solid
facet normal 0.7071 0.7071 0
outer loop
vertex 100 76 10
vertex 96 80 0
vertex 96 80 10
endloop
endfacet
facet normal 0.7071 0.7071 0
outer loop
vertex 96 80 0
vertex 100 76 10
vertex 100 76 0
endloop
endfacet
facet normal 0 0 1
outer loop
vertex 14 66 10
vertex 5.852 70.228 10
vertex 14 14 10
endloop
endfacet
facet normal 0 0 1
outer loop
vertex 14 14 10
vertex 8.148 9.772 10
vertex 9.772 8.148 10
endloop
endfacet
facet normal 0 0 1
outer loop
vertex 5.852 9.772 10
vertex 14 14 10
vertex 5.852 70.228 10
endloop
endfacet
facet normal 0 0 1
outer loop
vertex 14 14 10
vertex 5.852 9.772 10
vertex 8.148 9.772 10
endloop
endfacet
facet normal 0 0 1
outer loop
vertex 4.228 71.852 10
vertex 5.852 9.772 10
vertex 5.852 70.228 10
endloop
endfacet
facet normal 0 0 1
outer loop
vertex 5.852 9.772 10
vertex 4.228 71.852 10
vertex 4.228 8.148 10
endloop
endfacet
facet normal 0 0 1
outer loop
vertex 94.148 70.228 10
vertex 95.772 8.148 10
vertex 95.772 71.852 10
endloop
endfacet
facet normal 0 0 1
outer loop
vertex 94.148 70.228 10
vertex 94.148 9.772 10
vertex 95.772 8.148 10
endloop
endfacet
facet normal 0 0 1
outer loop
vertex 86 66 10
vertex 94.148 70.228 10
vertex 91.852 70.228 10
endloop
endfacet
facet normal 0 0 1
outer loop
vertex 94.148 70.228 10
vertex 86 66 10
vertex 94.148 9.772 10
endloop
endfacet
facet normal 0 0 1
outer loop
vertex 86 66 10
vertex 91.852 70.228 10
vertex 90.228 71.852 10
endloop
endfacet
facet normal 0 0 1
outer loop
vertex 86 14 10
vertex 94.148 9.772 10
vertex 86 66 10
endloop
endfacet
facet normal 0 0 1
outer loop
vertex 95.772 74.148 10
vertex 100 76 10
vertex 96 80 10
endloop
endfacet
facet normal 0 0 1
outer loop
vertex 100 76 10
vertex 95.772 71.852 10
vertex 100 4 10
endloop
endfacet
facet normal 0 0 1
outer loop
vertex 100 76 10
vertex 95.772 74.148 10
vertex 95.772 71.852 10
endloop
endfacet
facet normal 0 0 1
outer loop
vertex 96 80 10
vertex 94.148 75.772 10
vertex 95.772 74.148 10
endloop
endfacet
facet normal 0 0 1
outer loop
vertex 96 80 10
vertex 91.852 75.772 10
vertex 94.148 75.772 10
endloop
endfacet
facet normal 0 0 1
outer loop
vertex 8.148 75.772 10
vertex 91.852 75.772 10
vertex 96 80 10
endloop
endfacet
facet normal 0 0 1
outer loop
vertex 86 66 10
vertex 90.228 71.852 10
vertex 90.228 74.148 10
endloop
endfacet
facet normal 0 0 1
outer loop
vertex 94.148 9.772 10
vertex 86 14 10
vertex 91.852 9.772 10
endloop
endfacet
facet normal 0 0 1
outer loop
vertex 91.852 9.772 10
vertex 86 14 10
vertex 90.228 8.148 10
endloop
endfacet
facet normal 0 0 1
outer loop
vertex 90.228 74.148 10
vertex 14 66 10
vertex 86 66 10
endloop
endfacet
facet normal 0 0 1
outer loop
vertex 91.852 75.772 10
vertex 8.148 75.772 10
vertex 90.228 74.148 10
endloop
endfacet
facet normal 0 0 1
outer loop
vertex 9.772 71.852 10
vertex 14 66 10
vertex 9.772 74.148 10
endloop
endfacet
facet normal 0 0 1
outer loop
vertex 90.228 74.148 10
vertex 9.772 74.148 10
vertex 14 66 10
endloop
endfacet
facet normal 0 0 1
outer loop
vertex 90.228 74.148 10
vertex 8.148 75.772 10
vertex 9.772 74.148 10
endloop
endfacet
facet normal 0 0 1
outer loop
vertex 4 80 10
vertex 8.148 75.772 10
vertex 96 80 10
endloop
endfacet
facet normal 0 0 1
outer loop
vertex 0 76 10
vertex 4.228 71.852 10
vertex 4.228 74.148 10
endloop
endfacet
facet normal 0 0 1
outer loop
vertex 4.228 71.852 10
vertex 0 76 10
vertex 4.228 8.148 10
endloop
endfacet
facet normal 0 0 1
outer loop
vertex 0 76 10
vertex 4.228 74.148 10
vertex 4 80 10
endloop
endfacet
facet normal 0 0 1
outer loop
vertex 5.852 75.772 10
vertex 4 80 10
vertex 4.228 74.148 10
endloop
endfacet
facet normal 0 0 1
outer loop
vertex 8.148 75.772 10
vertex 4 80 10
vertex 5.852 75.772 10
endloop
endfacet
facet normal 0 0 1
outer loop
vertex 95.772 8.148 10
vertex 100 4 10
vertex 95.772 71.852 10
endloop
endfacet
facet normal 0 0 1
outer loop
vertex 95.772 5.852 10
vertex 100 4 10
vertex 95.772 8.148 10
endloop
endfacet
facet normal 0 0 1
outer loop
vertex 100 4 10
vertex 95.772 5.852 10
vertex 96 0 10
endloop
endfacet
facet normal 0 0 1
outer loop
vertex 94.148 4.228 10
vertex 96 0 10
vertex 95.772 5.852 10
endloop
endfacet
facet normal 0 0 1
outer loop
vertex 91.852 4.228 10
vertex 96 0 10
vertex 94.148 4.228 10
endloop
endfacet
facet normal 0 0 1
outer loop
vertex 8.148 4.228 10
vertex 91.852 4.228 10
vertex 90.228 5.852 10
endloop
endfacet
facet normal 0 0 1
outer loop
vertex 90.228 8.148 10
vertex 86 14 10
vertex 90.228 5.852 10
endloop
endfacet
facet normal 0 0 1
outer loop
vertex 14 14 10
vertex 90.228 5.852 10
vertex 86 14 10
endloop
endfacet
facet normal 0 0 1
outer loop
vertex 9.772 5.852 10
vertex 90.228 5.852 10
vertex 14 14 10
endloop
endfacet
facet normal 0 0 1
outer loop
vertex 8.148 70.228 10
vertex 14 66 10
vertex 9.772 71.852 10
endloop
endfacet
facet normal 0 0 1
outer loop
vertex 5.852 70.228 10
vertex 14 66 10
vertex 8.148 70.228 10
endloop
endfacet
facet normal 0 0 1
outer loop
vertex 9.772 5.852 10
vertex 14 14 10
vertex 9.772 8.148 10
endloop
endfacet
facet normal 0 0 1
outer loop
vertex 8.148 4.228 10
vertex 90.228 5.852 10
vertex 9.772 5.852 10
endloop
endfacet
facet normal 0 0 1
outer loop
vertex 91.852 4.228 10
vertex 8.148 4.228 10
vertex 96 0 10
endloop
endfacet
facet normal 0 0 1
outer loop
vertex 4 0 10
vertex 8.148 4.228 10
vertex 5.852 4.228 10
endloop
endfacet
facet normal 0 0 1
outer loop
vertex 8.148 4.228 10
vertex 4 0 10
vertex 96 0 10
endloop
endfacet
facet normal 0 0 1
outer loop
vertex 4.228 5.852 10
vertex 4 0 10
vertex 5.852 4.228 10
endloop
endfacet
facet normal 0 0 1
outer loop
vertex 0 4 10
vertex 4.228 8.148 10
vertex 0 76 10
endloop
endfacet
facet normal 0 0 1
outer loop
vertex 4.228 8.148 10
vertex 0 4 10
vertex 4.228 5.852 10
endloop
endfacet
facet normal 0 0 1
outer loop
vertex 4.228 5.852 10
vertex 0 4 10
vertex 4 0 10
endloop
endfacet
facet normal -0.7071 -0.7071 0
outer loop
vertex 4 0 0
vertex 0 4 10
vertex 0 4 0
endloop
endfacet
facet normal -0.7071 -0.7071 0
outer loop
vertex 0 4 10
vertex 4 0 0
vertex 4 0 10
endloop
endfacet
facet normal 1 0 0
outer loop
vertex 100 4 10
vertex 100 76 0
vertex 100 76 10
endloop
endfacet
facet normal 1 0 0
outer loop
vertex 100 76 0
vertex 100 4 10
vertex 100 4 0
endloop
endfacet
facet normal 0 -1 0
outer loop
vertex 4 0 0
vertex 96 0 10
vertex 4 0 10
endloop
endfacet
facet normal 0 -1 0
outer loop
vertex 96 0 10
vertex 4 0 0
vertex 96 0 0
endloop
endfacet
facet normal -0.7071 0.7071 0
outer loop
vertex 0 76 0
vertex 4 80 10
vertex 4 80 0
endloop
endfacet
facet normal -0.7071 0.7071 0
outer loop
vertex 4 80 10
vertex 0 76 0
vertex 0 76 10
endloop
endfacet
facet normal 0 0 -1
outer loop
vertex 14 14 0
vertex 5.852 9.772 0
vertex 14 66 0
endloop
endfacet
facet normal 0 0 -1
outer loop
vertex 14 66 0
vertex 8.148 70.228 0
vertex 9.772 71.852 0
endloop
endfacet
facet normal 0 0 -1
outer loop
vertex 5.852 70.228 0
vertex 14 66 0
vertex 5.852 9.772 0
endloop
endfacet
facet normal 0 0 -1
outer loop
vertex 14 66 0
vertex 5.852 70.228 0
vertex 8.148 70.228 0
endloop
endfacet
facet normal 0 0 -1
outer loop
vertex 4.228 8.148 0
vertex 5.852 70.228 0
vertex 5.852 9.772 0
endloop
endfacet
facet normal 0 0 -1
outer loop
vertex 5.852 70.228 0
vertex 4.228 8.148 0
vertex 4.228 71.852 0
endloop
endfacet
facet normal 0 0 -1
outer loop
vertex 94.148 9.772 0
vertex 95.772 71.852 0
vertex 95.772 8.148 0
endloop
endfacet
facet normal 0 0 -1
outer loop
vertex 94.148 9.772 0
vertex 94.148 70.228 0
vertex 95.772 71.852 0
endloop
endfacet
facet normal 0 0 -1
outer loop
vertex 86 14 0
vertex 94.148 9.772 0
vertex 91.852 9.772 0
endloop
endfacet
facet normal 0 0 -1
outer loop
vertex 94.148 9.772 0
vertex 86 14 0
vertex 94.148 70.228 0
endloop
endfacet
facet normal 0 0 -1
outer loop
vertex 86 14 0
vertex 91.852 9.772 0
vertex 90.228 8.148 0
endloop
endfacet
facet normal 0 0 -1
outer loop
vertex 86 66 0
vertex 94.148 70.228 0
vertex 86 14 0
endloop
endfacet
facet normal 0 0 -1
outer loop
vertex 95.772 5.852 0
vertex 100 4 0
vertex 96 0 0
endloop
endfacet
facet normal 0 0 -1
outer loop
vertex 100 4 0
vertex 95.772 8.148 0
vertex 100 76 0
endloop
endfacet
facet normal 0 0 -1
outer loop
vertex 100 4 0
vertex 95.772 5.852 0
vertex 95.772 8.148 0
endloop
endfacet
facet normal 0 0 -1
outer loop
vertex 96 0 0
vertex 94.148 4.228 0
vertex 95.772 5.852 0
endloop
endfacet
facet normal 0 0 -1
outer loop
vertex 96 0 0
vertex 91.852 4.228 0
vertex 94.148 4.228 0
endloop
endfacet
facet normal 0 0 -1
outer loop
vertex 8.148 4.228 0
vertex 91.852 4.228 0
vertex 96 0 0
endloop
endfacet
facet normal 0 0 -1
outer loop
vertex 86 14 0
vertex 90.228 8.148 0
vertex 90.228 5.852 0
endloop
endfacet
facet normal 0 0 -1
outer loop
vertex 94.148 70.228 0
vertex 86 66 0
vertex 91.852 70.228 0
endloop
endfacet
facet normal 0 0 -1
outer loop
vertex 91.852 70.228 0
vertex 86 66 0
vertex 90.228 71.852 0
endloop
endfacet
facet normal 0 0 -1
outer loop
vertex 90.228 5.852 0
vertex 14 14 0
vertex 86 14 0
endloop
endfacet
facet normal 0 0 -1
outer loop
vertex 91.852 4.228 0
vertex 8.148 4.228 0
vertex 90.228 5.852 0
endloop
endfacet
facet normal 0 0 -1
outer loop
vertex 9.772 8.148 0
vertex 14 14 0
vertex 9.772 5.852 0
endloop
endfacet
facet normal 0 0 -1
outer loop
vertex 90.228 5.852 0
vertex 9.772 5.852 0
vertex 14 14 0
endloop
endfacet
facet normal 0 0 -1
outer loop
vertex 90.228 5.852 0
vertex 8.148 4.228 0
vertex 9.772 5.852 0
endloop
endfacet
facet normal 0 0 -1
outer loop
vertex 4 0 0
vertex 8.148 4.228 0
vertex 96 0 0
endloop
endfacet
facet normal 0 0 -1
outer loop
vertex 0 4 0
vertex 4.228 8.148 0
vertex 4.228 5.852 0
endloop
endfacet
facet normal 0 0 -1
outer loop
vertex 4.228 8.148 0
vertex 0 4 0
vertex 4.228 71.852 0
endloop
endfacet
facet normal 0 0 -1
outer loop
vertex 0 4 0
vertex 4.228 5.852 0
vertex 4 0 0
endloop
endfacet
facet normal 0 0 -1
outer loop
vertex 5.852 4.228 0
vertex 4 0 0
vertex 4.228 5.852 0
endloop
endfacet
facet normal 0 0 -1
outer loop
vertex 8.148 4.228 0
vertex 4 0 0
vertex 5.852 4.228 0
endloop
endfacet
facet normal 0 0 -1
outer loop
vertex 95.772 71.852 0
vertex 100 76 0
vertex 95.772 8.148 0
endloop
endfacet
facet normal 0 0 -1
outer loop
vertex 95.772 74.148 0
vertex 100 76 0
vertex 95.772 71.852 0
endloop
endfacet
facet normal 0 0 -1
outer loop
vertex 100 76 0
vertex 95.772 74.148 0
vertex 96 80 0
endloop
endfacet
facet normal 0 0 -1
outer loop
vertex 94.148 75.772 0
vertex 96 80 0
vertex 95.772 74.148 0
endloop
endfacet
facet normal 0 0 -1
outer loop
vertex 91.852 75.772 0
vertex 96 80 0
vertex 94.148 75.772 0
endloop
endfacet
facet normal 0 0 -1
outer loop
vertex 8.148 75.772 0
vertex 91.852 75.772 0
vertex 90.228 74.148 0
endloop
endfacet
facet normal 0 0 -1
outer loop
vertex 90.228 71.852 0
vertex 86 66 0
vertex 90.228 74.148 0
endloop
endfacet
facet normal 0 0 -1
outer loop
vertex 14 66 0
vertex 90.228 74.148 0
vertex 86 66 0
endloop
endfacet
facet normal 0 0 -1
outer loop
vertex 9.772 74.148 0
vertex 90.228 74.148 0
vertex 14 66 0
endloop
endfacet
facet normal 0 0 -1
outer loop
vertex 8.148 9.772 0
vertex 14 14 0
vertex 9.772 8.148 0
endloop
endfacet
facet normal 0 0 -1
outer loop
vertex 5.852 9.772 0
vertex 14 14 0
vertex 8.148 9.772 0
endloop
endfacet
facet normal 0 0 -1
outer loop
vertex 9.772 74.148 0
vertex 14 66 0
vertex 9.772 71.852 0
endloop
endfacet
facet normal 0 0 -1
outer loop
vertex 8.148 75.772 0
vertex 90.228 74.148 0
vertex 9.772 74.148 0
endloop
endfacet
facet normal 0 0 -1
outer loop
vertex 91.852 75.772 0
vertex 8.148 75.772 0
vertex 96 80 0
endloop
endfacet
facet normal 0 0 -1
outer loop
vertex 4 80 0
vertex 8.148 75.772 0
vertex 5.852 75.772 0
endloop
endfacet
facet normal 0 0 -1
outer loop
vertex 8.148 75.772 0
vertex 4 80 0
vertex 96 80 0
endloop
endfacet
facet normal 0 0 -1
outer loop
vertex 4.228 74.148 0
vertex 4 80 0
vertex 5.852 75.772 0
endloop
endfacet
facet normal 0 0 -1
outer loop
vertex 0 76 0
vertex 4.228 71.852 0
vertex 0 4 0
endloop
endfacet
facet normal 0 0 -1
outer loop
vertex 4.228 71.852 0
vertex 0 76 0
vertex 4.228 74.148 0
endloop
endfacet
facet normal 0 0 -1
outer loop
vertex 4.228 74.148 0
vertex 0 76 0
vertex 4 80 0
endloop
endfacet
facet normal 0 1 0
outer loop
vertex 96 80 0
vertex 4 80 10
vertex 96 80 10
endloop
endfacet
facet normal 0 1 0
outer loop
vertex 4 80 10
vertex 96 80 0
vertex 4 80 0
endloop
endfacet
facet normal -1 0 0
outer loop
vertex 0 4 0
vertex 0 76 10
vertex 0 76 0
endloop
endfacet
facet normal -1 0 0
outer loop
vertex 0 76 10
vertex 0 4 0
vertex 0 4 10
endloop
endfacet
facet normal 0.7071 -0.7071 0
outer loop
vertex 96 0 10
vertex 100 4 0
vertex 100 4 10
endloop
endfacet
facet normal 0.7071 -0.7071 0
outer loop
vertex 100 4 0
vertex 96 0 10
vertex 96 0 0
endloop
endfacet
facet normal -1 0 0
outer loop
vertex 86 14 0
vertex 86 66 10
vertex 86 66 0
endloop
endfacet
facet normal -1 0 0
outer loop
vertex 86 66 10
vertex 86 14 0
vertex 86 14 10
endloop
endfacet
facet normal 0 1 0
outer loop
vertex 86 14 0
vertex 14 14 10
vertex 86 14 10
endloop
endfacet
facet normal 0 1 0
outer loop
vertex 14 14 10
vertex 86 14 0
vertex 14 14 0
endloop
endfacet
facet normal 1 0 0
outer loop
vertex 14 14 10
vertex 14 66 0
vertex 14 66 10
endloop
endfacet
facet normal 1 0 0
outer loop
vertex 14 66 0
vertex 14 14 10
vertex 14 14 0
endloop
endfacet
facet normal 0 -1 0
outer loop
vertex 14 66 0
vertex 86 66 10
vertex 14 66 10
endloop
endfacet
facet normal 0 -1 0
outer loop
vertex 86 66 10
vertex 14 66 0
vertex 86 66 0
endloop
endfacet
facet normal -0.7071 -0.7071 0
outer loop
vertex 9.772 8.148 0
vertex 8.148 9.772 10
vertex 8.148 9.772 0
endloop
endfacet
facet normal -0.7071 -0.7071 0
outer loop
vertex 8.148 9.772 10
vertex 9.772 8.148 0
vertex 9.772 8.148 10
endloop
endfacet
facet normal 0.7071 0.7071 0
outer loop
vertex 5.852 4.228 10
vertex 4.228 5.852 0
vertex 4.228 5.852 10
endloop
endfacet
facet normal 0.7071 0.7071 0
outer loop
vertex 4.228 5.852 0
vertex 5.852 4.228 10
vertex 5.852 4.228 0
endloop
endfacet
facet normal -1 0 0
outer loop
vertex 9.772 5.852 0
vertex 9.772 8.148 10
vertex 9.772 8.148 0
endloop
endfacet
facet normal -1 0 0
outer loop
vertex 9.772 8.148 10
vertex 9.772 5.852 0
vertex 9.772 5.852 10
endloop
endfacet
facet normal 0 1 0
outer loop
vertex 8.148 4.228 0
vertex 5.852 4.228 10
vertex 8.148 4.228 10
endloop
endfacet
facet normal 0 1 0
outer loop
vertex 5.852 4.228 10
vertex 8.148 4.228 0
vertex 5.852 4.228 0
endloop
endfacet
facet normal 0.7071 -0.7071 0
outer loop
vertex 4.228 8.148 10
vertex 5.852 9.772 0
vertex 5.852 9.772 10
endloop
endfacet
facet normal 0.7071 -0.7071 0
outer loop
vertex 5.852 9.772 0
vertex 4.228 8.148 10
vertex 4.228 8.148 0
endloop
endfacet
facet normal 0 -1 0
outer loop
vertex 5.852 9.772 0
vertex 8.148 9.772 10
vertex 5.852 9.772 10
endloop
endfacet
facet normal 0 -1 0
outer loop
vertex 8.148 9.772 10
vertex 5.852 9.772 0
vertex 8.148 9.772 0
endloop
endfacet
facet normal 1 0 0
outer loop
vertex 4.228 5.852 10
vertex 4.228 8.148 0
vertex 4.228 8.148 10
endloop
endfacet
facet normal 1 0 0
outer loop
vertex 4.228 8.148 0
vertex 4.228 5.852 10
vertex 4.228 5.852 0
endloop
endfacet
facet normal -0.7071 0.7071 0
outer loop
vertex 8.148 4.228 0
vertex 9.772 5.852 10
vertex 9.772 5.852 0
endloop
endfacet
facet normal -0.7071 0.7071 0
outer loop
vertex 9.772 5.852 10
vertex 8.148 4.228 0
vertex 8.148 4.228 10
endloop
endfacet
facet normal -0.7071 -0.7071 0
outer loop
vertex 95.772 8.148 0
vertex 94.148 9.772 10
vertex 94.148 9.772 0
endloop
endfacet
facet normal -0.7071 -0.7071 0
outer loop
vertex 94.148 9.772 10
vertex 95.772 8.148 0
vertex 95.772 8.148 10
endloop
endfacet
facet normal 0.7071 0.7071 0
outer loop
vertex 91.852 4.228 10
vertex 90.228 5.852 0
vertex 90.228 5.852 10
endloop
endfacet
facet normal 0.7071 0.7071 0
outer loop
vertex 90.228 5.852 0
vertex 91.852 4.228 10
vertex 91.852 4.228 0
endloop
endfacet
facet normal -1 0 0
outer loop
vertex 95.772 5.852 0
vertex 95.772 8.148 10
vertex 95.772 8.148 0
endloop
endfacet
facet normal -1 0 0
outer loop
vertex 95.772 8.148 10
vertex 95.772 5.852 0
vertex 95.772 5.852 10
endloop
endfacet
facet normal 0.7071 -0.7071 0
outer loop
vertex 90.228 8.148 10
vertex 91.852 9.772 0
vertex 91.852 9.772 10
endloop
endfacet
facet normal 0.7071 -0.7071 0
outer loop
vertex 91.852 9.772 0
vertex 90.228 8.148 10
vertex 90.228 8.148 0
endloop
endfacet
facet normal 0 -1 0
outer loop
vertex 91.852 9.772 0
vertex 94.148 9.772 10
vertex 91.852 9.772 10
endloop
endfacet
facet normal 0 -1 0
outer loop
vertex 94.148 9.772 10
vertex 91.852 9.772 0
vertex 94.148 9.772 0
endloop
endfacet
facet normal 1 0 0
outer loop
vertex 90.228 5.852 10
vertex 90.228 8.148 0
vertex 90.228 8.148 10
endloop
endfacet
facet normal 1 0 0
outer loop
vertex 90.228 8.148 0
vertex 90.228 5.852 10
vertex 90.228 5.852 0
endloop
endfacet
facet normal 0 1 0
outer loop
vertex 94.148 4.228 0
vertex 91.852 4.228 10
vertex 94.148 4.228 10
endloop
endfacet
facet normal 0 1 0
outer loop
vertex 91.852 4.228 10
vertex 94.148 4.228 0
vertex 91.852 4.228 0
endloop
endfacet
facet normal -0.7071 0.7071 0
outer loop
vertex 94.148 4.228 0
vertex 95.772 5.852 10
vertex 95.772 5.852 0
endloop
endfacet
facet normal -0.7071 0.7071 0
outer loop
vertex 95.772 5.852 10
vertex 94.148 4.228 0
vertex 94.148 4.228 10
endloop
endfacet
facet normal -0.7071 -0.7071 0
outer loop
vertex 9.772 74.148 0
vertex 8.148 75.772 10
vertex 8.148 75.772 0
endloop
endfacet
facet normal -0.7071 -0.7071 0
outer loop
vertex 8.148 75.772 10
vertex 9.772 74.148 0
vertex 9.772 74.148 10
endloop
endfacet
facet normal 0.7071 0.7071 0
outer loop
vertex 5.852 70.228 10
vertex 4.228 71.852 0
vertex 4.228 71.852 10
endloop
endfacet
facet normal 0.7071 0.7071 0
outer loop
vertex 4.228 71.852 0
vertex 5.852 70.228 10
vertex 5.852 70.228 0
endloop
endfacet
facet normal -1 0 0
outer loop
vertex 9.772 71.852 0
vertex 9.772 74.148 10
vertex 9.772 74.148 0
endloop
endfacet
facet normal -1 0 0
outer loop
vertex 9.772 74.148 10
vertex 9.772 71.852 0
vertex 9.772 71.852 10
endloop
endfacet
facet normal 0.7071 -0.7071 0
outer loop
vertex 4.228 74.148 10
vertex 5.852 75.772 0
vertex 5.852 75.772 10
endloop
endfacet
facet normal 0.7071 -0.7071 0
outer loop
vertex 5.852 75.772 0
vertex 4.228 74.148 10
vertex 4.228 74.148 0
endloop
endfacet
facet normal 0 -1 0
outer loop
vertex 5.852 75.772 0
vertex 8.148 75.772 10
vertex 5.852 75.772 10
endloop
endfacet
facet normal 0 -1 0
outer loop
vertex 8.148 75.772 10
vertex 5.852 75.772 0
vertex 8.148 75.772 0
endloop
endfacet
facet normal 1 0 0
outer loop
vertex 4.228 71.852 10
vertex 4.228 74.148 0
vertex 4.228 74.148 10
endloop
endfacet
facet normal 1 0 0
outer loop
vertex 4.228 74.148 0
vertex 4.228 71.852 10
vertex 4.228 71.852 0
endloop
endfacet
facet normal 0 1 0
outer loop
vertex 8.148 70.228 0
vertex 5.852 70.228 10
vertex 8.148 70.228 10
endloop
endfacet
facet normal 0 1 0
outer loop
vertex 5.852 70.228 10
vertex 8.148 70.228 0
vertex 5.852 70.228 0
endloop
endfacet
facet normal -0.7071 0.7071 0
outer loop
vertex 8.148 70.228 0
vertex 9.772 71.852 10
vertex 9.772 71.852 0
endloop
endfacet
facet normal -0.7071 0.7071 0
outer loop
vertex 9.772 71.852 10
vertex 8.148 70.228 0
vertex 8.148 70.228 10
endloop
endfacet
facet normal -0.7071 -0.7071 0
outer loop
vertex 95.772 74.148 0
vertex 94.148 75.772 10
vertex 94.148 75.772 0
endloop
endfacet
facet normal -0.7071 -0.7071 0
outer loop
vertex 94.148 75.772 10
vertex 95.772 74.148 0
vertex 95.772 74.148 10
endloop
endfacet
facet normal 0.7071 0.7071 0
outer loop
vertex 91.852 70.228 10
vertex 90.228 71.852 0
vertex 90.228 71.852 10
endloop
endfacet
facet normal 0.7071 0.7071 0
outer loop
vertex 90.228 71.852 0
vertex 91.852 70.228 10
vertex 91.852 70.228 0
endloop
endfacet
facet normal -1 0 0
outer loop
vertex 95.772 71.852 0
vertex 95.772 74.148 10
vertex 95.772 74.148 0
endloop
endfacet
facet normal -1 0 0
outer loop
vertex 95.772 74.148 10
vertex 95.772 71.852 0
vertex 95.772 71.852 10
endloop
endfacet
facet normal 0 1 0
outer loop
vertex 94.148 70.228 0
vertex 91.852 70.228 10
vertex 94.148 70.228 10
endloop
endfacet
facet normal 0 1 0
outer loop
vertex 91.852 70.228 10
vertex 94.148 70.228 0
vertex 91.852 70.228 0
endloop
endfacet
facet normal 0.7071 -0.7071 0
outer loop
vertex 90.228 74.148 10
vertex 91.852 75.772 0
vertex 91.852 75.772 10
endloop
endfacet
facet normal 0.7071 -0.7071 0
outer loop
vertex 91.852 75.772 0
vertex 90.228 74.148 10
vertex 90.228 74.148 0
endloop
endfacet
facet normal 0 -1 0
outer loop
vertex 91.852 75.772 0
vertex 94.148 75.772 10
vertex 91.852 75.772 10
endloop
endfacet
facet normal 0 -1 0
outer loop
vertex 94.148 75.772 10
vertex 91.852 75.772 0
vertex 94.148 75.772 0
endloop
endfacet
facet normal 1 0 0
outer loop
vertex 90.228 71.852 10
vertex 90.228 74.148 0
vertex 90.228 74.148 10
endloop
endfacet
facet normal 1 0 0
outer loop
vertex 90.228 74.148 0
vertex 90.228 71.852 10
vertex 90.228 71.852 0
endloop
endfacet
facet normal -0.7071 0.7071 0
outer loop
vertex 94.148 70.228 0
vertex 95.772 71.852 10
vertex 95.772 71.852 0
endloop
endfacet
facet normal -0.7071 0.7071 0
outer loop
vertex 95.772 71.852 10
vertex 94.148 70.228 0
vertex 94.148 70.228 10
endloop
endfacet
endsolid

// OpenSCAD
$fn = 32;

// ----------------------------------------------------------------------
// Frame plate: 100 x 80 frame, 14 mm rails
// ----------------------------------------------------------------------

// --- parameters (mm) ---
plate_l = 100;            // plate length, X
plate_w = 80;             // plate width, Y
plate_t = 10;             // plate thickness, Z (extrusion height)
corner_c = 4;             // corner chamfer
frame_bar = 14;           // frame rail width
bolt_r = 3;               // corner bolt window radius
bolt_inset = 7;           // bolt centre inset from the edges
fit_tol = 0.05;           // declared fit tolerance (prompt contract)
free_tol = 0.2;           // declared free tolerance (prompt contract)

win_l = plate_l - 2 * frame_bar;  // window length
win_w = plate_w - 2 * frame_bar;  // window width
bolt_d = 2 * bolt_r;  // corner hole diameter

profile = [[4, 0], [96, 0], [100, 4], [100, 76], [96, 80], [4, 80], [0, 76], [0, 4]];  // primary outline, 8 points, counter clockwise
void_1 = [[14, 14], [86, 14], [86, 66], [14, 66]];  // the window, 4 points
void_2 = [[9.772, 8.148], [8.148, 9.772], [5.852, 9.772], [4.228, 8.148], [4.228, 5.852], [5.852, 4.228], [8.148, 4.228], [9.772, 5.852]];  // corner bolt window, 8 points
void_3 = [[95.772, 8.148], [94.148, 9.772], [91.852, 9.772], [90.228, 8.148], [90.228, 5.852], [91.852, 4.228], [94.148, 4.228], [95.772, 5.852]];  // corner bolt window, 8 points
void_4 = [[9.772, 74.148], [8.148, 75.772], [5.852, 75.772], [4.228, 74.148], [4.228, 71.852], [5.852, 70.228], [8.148, 70.228], [9.772, 71.852]];  // corner bolt window, 8 points
void_5 = [[95.772, 74.148], [94.148, 75.772], [91.852, 75.772], [90.228, 74.148], [90.228, 71.852], [91.852, 70.228], [94.148, 70.228], [95.772, 71.852]];  // corner bolt window, 8 points

// --- the one profile operation ---
difference() {
  linear_extrude(height = plate_t) polygon(points = profile);
  translate([0, 0, -1])
    linear_extrude(height = plate_t + 2) polygon(points = void_1);
  translate([0, 0, -1])
    linear_extrude(height = plate_t + 2) polygon(points = void_2);
  translate([0, 0, -1])
    linear_extrude(height = plate_t + 2) polygon(points = void_3);
  translate([0, 0, -1])
    linear_extrude(height = plate_t + 2) polygon(points = void_4);
  translate([0, 0, -1])
    linear_extrude(height = plate_t + 2) polygon(points = void_5);
}
